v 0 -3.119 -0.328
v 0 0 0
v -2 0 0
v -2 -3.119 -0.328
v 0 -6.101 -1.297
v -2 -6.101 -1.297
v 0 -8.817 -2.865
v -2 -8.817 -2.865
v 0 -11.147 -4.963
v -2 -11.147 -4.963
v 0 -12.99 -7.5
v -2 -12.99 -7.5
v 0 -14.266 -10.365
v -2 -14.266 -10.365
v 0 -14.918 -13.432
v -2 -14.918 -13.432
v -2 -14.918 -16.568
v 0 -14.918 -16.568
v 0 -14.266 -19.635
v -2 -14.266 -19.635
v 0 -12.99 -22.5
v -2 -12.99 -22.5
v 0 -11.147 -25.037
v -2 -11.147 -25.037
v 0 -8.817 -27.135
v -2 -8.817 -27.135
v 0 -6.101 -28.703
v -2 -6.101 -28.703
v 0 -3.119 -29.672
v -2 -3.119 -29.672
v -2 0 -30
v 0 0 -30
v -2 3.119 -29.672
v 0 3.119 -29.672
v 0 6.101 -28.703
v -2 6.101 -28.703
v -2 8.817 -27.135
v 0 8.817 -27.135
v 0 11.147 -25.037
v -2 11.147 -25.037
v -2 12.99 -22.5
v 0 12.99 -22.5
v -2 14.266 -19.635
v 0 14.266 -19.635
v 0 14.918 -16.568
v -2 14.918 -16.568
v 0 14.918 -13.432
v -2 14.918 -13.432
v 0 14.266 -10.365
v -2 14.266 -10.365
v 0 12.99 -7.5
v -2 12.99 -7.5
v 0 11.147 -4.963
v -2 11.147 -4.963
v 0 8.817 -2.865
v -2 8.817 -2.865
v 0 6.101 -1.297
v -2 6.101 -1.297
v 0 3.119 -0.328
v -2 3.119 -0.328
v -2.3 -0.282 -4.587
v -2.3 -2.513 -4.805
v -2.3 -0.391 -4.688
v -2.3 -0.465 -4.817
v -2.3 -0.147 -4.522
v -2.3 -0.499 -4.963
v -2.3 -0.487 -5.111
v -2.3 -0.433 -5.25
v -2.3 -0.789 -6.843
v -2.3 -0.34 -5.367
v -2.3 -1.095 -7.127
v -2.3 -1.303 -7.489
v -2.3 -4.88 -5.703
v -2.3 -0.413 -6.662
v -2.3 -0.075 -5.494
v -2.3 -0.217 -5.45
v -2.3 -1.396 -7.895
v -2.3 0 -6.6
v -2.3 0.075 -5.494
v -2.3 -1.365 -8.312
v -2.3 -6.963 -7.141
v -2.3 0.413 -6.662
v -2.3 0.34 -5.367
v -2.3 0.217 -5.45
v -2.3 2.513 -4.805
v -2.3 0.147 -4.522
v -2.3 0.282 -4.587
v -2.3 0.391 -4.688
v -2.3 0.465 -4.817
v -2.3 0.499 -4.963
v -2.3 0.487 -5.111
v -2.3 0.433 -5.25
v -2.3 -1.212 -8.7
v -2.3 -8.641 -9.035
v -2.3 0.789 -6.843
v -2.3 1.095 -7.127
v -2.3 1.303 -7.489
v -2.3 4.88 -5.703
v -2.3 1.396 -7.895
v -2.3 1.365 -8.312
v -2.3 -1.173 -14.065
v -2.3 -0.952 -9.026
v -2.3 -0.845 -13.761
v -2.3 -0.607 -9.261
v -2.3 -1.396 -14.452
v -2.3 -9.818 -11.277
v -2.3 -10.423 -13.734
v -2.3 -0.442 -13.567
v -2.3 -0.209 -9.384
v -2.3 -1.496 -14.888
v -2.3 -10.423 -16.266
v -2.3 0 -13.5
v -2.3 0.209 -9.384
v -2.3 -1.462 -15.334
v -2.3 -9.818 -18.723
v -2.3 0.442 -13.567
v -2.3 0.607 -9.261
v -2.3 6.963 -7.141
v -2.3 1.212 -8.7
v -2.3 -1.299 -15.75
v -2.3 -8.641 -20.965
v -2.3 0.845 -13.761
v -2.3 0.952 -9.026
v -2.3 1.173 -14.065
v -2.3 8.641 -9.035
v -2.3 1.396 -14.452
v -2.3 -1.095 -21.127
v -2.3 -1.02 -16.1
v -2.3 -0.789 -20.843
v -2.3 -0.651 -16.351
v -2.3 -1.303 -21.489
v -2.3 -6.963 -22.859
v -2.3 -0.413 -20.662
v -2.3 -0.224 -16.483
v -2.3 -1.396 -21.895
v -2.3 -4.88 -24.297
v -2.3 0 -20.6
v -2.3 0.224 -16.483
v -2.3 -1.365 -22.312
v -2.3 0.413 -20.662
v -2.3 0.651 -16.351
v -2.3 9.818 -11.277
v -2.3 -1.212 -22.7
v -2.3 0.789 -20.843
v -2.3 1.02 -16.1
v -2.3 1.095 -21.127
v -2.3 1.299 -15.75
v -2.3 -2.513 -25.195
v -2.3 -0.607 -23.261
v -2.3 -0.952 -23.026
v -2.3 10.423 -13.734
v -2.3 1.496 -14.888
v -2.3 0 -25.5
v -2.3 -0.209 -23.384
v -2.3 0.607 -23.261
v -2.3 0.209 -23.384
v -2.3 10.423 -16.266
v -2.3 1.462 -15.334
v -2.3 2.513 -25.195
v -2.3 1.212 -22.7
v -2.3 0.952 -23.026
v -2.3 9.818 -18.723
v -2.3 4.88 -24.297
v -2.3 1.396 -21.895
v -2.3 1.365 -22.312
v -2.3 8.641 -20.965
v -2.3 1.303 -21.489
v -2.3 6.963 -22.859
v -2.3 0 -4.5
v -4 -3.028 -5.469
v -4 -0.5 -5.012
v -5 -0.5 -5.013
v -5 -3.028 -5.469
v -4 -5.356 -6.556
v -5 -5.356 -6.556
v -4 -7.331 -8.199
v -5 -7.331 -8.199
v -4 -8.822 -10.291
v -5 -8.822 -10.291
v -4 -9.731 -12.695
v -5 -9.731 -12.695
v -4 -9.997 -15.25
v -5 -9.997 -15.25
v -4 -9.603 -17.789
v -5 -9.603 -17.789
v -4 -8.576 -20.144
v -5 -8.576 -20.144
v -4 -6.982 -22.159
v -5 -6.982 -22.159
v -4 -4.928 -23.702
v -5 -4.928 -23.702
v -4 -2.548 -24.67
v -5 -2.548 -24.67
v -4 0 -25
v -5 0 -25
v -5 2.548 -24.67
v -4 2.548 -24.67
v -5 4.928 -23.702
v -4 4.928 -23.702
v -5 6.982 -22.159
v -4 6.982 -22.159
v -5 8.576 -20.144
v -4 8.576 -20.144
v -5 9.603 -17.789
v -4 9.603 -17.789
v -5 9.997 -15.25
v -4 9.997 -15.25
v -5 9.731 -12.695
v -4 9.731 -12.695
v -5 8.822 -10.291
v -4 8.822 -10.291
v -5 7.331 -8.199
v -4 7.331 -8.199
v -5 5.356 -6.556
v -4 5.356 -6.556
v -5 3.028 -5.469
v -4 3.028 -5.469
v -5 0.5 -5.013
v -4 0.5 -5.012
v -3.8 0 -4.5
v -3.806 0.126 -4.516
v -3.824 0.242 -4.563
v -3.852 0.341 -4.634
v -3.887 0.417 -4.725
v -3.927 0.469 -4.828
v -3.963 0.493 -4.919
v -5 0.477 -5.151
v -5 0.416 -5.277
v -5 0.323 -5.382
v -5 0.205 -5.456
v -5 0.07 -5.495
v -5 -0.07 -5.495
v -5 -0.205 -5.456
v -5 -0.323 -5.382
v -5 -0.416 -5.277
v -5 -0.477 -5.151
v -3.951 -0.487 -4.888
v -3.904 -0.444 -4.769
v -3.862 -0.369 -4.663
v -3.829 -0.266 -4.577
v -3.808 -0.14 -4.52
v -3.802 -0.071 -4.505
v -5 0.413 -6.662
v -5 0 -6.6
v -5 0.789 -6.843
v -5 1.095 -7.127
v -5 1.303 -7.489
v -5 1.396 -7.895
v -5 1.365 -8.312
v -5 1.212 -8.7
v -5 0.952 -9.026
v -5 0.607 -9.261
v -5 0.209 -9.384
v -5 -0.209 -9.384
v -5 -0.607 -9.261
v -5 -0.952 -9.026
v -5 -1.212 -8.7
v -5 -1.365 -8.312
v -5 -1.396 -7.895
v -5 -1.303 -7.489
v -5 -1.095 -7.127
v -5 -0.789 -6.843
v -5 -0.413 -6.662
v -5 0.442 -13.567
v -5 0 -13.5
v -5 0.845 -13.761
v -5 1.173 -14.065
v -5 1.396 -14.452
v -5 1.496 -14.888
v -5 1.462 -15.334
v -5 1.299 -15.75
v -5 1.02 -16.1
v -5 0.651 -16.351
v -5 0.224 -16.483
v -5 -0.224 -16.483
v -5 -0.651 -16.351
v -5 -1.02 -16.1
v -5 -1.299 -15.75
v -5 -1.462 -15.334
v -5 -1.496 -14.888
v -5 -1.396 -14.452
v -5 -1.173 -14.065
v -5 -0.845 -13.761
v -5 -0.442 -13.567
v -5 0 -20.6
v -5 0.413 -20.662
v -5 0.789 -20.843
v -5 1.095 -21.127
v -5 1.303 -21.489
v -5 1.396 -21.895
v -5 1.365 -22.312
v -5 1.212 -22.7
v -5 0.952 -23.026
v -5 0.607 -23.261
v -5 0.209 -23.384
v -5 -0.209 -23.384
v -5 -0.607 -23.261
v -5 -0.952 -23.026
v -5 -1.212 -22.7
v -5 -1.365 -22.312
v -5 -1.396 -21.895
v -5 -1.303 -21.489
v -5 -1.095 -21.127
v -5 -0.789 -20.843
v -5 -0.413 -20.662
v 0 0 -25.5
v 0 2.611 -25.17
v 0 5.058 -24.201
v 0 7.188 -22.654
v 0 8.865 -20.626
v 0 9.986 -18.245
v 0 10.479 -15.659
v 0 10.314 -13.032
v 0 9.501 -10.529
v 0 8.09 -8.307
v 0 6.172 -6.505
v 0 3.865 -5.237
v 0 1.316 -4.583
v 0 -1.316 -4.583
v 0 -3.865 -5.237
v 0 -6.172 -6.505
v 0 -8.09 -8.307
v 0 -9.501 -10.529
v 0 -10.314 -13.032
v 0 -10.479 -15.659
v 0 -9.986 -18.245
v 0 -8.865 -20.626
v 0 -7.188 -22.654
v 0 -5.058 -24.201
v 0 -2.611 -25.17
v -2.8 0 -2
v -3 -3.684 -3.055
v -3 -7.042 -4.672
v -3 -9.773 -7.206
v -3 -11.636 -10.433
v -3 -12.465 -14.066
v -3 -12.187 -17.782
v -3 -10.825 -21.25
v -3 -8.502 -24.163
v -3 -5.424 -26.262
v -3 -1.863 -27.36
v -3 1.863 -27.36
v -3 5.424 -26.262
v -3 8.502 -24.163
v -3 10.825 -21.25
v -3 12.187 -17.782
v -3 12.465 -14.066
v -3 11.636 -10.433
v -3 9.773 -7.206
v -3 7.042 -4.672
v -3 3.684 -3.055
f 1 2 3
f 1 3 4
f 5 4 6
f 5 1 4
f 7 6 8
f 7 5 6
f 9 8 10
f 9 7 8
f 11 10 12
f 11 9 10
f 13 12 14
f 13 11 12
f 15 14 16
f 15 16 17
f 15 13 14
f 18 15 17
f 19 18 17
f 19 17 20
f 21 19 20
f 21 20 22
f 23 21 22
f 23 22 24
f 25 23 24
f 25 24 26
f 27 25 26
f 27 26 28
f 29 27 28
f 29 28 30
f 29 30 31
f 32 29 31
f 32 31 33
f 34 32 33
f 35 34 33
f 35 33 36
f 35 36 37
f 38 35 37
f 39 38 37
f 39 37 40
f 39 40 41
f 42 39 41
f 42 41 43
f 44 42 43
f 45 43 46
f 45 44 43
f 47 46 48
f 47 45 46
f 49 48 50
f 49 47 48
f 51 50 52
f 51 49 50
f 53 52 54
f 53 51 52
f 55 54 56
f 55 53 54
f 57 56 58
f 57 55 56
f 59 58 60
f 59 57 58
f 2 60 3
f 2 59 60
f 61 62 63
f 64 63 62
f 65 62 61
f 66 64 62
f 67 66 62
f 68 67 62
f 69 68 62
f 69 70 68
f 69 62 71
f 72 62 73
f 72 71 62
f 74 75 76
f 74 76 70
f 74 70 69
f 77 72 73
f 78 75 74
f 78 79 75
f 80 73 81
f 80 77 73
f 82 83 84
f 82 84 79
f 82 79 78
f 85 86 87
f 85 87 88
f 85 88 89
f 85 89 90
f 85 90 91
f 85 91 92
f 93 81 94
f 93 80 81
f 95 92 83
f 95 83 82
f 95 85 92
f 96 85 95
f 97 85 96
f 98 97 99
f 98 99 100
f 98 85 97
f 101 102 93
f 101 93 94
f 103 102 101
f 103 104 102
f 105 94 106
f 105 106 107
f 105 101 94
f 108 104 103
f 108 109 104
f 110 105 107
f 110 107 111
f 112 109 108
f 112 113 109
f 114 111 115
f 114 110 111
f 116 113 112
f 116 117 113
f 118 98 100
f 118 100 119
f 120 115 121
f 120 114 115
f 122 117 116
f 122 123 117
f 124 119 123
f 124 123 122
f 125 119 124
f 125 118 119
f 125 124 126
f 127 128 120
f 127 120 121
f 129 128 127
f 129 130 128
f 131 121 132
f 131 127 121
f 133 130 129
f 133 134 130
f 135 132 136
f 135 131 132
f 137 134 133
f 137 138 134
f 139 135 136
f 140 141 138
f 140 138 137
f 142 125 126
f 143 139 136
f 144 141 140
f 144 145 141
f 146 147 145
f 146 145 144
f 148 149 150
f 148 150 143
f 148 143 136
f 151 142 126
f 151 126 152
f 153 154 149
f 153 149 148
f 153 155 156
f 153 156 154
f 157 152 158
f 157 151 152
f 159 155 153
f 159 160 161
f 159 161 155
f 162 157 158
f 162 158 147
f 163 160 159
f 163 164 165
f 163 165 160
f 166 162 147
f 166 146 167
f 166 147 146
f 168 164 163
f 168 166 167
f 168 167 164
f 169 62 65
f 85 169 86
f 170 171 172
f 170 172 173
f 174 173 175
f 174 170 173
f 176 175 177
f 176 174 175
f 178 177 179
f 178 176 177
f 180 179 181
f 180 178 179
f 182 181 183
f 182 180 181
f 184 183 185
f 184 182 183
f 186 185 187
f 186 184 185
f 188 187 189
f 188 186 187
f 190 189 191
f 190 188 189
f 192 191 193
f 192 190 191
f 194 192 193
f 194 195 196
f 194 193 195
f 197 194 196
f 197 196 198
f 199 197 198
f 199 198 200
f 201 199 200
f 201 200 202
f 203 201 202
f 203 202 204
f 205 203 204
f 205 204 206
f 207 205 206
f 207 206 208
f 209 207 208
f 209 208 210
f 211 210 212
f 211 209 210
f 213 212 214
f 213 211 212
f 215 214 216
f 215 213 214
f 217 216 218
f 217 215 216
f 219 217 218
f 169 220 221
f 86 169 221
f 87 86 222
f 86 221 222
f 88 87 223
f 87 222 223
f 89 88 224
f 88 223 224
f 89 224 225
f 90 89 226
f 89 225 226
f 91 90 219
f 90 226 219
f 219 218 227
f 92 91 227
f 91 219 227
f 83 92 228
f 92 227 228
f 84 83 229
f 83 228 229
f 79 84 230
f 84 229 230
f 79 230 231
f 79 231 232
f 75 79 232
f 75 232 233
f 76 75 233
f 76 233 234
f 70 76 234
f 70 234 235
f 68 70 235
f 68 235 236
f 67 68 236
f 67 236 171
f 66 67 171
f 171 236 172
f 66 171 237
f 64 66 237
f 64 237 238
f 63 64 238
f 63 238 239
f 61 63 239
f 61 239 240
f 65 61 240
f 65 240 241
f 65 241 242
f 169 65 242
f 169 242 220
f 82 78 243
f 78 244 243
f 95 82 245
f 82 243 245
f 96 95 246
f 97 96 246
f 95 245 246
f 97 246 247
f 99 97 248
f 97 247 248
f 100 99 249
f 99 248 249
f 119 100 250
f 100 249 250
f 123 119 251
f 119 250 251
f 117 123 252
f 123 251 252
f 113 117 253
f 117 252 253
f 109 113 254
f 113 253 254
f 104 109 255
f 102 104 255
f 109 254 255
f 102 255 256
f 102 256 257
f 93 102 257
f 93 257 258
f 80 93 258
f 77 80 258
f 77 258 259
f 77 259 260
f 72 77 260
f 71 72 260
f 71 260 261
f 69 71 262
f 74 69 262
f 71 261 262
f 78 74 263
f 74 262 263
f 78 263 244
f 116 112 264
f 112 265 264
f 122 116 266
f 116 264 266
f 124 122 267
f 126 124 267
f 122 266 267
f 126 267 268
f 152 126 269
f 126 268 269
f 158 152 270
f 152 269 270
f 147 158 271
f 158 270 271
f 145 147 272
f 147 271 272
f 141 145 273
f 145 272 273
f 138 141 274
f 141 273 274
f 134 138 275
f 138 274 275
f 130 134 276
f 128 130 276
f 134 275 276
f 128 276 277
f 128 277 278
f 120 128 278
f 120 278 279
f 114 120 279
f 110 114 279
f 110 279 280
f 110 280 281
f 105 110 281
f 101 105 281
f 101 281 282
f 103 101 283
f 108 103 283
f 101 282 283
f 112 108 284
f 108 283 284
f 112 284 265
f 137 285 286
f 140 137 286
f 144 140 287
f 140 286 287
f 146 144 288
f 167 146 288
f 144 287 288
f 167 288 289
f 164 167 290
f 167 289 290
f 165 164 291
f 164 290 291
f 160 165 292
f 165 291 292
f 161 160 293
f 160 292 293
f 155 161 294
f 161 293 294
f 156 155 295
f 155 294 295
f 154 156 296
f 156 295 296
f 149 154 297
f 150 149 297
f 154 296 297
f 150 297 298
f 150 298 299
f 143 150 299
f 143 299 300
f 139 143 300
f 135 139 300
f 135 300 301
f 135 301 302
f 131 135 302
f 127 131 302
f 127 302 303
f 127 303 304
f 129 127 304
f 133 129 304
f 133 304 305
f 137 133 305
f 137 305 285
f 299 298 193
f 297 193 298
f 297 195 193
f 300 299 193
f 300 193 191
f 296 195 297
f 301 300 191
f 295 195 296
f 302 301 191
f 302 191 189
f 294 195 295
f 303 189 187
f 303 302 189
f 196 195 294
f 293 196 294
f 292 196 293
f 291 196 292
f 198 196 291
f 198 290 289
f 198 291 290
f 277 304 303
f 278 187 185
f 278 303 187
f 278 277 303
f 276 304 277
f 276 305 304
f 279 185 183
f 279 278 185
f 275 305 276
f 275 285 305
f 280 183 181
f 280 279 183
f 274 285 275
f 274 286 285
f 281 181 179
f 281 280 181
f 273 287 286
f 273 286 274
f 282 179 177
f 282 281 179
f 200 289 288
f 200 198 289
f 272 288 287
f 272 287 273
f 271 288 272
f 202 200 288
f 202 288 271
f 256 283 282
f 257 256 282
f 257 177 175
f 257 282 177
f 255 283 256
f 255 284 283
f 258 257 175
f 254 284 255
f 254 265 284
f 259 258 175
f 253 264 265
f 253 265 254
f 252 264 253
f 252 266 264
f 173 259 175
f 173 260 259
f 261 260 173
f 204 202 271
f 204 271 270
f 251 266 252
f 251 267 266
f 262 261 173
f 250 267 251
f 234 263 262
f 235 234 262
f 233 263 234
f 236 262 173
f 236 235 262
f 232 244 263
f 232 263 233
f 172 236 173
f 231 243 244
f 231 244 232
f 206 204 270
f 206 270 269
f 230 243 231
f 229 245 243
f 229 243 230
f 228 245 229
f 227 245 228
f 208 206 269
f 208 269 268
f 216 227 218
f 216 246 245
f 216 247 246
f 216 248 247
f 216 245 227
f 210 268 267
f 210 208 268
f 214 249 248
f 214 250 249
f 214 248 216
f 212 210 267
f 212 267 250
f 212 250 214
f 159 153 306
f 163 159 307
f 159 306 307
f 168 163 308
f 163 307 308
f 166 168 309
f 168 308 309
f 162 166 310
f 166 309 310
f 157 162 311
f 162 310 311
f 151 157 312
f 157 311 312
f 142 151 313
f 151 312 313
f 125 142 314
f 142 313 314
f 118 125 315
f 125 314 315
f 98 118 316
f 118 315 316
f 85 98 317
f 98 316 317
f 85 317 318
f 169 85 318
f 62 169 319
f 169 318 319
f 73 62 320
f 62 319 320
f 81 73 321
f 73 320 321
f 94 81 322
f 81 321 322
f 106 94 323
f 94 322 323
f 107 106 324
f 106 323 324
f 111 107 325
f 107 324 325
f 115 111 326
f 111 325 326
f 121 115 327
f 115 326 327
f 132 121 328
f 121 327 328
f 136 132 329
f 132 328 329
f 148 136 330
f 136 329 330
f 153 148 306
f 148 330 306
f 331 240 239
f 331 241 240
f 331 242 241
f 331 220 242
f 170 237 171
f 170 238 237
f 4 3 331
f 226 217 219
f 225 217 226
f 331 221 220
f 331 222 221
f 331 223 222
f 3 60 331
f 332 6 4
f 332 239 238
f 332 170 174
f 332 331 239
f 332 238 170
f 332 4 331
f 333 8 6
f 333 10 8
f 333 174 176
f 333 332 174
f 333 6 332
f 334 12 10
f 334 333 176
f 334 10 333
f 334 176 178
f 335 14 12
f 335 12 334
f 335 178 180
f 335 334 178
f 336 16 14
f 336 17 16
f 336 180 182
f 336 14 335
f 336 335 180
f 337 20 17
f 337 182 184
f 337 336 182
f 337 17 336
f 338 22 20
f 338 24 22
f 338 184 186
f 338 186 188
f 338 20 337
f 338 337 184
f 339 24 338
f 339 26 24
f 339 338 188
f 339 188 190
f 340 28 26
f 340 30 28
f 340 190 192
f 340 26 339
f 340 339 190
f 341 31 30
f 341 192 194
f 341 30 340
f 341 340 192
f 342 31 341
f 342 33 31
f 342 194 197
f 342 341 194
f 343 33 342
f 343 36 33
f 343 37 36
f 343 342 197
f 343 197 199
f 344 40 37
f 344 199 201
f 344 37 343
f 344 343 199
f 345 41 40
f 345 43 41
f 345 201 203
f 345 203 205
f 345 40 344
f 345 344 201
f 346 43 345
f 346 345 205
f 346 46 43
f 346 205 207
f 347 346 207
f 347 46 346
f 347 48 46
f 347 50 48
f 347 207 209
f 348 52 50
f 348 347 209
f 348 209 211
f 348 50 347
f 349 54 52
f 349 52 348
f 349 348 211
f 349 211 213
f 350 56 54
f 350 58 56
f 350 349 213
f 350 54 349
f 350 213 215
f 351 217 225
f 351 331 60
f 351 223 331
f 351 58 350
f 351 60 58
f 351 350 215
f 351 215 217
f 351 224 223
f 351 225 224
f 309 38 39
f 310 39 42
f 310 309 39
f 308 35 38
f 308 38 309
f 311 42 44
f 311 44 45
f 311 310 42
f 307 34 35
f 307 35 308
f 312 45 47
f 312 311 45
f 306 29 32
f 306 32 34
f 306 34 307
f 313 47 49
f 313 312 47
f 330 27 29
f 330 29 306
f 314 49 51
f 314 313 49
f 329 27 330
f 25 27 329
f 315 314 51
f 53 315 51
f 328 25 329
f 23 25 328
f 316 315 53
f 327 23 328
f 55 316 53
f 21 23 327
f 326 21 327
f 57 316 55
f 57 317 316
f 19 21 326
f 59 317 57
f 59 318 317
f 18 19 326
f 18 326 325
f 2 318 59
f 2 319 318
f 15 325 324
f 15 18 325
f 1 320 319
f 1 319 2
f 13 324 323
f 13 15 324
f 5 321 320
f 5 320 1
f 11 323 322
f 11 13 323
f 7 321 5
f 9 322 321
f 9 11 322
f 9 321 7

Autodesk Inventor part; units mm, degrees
ref_plane "YZ Plane" through (0, 0, 0) normal (1, 0, 0) x (0, 1, 0)
ref_plane "XZ Plane" through (0, 0, 0) normal (0, 1, 0) x (-1, 0, 0)
ref_plane "XY Plane" through (0, 0, 0) normal (0, 0, 1) x (1, 0, 0)
sketch "Náčrt1" plane through (0, 0, 0) normal (0, 1, 0) x (-1, 0, 0)
  line L0 (0, 0) -> (0, -15)
  line L1 (10, 0) -> (10, -15)
  line L2 (6, -5) -> (4, -5)
  line L3 (10, -15) -> (0, -15)
  line L4 (6, -5) -> (8, 0)
  line L5 (8, 0) -> (10, 0)
  line L6 (4, -5) -> (2, 0)
  line L7 (2, 0) -> (0, 0)
  dimension "d0" = 2
  dimension "d1" = 5
  dimension "d2" = 15
  dimension "d5" = 2
  dimension "d6" = 10
revolve "Rotace1" add sketch "Náčrt1" angle 360 about axis through (-10, 0, -15) along (1, 0, 0)
sketch "Náčrt2" plane through (0, 0, -15) normal (1, 0, 0) x (0, 0, -1)
  circle A0 centre (0, 0) radius 15 projected
  circle A1 centre (0, 0) radius 10 projected
  circle A2 centre (0, 0) radius 10.5
  point P0 (-15, 0)
  dimension "d8" = 21
extrude "Vysunutí1" cut sketch "Náčrt2" against normal blind 2.3 contours A1 | A2
sketch "Náčrt3" plane through (-10, 0, -15) normal (-1, 0, 0) x (0, 0, 1)
  circle A0 centre (0, 0) radius 15 projected
  circle A1 centre (0, 0) radius 3
  point P0 (15, 0)
  dimension "d11" = 6
extrude "Vysunutí2" cut sketch "Náčrt3" against normal blind 3 contours A1
sketch "Náčrt4" plane through (-7, 0, -15) normal (-1, 0, 0) x (0, 0, 1)
  circle A0 centre (0, 0) radius 15 projected
  circle A1 centre (0, 0) radius 10 projected
  circle A2 centre (0, 0) radius 1.5
  point P0 (15, 0)
  dimension "d14" = 3
extrude "Vysunutí3" cut sketch "Náčrt4" against normal through all contours A2
sketch "Náčrt5" plane through (-10, 0, -15) normal (-1, 0, 0) x (0, 0, 1)
  circle A0 centre (0, 0) radius 3 projected
  circle A1 centre (0, 0) radius 15 projected
  circle A2 centre (0, 0) radius 1.5 construction
  circle A3 centre (0, 0) radius 7 construction
  circle A4 centre (7, 0) radius 1.4
  circle A5 centre (0, 0) radius 10 construction
  circle A6 centre (10, 0) radius 0.5
  circle A7 centre (0, 0) radius 15 construction
  line L0 (0, 15) -> (0, -15) construction
  circle A8 centre (-7, 0) radius 1.4
  point P0 (15, 0)
  dimension "d17" = 8
  dimension "d18" = 2.8
  dimension "d21" = 5
  dimension "d22" = 1
extrude "Vysunutí4" cut sketch "Náčrt5" against normal through all contours A4 | A6 | A8
sketch "Náčrt6" plane through (-10, 0, -15) normal (-1, 0, 0) x (0, 0, 1)
  circle A0 centre (7, 0) radius 1.4 projected
  circle A1 centre (10, 0) radius 0.5 projected
  circle A2 centre (0, 0) radius 3 projected
  circle A3 centre (0, 0) radius 15 projected
  point P0 (15, 0)
ref_plane "Pracovní rovina1" through (-6, 0, -15) normal (-1, 0, 0) x (0, 0, 1)
split "Rozdělit1" plane through (-6, 0, -15) removes the side toward (-1, 0, 0)
sketch "Sketch7" plane through (-6, 0, -15) normal (-1, 0, 0) x (0, 0, 1)
  circle A0 centre (-7, 0) radius 1.5 projected
  circle A1 centre (7, 0) radius 1.4 projected
  arc A2 (9.9875, 0.4998) -> (9.9875, -0.4998) centre (10, 0) ccw projected
  arc A3 (9.9875, 0.4998) -> (9.9875, -0.4998) centre (0, 0) ccw projected
  circle A4 centre (0, 0) radius 1.5 projected
  point P0 (15, 0)
extrude "Extrusion5" cut sketch "Sketch7" against normal blind 1 contours A0 | A1 | A2 A3 | A4
properties part number "bubinek_BOTTOM"
